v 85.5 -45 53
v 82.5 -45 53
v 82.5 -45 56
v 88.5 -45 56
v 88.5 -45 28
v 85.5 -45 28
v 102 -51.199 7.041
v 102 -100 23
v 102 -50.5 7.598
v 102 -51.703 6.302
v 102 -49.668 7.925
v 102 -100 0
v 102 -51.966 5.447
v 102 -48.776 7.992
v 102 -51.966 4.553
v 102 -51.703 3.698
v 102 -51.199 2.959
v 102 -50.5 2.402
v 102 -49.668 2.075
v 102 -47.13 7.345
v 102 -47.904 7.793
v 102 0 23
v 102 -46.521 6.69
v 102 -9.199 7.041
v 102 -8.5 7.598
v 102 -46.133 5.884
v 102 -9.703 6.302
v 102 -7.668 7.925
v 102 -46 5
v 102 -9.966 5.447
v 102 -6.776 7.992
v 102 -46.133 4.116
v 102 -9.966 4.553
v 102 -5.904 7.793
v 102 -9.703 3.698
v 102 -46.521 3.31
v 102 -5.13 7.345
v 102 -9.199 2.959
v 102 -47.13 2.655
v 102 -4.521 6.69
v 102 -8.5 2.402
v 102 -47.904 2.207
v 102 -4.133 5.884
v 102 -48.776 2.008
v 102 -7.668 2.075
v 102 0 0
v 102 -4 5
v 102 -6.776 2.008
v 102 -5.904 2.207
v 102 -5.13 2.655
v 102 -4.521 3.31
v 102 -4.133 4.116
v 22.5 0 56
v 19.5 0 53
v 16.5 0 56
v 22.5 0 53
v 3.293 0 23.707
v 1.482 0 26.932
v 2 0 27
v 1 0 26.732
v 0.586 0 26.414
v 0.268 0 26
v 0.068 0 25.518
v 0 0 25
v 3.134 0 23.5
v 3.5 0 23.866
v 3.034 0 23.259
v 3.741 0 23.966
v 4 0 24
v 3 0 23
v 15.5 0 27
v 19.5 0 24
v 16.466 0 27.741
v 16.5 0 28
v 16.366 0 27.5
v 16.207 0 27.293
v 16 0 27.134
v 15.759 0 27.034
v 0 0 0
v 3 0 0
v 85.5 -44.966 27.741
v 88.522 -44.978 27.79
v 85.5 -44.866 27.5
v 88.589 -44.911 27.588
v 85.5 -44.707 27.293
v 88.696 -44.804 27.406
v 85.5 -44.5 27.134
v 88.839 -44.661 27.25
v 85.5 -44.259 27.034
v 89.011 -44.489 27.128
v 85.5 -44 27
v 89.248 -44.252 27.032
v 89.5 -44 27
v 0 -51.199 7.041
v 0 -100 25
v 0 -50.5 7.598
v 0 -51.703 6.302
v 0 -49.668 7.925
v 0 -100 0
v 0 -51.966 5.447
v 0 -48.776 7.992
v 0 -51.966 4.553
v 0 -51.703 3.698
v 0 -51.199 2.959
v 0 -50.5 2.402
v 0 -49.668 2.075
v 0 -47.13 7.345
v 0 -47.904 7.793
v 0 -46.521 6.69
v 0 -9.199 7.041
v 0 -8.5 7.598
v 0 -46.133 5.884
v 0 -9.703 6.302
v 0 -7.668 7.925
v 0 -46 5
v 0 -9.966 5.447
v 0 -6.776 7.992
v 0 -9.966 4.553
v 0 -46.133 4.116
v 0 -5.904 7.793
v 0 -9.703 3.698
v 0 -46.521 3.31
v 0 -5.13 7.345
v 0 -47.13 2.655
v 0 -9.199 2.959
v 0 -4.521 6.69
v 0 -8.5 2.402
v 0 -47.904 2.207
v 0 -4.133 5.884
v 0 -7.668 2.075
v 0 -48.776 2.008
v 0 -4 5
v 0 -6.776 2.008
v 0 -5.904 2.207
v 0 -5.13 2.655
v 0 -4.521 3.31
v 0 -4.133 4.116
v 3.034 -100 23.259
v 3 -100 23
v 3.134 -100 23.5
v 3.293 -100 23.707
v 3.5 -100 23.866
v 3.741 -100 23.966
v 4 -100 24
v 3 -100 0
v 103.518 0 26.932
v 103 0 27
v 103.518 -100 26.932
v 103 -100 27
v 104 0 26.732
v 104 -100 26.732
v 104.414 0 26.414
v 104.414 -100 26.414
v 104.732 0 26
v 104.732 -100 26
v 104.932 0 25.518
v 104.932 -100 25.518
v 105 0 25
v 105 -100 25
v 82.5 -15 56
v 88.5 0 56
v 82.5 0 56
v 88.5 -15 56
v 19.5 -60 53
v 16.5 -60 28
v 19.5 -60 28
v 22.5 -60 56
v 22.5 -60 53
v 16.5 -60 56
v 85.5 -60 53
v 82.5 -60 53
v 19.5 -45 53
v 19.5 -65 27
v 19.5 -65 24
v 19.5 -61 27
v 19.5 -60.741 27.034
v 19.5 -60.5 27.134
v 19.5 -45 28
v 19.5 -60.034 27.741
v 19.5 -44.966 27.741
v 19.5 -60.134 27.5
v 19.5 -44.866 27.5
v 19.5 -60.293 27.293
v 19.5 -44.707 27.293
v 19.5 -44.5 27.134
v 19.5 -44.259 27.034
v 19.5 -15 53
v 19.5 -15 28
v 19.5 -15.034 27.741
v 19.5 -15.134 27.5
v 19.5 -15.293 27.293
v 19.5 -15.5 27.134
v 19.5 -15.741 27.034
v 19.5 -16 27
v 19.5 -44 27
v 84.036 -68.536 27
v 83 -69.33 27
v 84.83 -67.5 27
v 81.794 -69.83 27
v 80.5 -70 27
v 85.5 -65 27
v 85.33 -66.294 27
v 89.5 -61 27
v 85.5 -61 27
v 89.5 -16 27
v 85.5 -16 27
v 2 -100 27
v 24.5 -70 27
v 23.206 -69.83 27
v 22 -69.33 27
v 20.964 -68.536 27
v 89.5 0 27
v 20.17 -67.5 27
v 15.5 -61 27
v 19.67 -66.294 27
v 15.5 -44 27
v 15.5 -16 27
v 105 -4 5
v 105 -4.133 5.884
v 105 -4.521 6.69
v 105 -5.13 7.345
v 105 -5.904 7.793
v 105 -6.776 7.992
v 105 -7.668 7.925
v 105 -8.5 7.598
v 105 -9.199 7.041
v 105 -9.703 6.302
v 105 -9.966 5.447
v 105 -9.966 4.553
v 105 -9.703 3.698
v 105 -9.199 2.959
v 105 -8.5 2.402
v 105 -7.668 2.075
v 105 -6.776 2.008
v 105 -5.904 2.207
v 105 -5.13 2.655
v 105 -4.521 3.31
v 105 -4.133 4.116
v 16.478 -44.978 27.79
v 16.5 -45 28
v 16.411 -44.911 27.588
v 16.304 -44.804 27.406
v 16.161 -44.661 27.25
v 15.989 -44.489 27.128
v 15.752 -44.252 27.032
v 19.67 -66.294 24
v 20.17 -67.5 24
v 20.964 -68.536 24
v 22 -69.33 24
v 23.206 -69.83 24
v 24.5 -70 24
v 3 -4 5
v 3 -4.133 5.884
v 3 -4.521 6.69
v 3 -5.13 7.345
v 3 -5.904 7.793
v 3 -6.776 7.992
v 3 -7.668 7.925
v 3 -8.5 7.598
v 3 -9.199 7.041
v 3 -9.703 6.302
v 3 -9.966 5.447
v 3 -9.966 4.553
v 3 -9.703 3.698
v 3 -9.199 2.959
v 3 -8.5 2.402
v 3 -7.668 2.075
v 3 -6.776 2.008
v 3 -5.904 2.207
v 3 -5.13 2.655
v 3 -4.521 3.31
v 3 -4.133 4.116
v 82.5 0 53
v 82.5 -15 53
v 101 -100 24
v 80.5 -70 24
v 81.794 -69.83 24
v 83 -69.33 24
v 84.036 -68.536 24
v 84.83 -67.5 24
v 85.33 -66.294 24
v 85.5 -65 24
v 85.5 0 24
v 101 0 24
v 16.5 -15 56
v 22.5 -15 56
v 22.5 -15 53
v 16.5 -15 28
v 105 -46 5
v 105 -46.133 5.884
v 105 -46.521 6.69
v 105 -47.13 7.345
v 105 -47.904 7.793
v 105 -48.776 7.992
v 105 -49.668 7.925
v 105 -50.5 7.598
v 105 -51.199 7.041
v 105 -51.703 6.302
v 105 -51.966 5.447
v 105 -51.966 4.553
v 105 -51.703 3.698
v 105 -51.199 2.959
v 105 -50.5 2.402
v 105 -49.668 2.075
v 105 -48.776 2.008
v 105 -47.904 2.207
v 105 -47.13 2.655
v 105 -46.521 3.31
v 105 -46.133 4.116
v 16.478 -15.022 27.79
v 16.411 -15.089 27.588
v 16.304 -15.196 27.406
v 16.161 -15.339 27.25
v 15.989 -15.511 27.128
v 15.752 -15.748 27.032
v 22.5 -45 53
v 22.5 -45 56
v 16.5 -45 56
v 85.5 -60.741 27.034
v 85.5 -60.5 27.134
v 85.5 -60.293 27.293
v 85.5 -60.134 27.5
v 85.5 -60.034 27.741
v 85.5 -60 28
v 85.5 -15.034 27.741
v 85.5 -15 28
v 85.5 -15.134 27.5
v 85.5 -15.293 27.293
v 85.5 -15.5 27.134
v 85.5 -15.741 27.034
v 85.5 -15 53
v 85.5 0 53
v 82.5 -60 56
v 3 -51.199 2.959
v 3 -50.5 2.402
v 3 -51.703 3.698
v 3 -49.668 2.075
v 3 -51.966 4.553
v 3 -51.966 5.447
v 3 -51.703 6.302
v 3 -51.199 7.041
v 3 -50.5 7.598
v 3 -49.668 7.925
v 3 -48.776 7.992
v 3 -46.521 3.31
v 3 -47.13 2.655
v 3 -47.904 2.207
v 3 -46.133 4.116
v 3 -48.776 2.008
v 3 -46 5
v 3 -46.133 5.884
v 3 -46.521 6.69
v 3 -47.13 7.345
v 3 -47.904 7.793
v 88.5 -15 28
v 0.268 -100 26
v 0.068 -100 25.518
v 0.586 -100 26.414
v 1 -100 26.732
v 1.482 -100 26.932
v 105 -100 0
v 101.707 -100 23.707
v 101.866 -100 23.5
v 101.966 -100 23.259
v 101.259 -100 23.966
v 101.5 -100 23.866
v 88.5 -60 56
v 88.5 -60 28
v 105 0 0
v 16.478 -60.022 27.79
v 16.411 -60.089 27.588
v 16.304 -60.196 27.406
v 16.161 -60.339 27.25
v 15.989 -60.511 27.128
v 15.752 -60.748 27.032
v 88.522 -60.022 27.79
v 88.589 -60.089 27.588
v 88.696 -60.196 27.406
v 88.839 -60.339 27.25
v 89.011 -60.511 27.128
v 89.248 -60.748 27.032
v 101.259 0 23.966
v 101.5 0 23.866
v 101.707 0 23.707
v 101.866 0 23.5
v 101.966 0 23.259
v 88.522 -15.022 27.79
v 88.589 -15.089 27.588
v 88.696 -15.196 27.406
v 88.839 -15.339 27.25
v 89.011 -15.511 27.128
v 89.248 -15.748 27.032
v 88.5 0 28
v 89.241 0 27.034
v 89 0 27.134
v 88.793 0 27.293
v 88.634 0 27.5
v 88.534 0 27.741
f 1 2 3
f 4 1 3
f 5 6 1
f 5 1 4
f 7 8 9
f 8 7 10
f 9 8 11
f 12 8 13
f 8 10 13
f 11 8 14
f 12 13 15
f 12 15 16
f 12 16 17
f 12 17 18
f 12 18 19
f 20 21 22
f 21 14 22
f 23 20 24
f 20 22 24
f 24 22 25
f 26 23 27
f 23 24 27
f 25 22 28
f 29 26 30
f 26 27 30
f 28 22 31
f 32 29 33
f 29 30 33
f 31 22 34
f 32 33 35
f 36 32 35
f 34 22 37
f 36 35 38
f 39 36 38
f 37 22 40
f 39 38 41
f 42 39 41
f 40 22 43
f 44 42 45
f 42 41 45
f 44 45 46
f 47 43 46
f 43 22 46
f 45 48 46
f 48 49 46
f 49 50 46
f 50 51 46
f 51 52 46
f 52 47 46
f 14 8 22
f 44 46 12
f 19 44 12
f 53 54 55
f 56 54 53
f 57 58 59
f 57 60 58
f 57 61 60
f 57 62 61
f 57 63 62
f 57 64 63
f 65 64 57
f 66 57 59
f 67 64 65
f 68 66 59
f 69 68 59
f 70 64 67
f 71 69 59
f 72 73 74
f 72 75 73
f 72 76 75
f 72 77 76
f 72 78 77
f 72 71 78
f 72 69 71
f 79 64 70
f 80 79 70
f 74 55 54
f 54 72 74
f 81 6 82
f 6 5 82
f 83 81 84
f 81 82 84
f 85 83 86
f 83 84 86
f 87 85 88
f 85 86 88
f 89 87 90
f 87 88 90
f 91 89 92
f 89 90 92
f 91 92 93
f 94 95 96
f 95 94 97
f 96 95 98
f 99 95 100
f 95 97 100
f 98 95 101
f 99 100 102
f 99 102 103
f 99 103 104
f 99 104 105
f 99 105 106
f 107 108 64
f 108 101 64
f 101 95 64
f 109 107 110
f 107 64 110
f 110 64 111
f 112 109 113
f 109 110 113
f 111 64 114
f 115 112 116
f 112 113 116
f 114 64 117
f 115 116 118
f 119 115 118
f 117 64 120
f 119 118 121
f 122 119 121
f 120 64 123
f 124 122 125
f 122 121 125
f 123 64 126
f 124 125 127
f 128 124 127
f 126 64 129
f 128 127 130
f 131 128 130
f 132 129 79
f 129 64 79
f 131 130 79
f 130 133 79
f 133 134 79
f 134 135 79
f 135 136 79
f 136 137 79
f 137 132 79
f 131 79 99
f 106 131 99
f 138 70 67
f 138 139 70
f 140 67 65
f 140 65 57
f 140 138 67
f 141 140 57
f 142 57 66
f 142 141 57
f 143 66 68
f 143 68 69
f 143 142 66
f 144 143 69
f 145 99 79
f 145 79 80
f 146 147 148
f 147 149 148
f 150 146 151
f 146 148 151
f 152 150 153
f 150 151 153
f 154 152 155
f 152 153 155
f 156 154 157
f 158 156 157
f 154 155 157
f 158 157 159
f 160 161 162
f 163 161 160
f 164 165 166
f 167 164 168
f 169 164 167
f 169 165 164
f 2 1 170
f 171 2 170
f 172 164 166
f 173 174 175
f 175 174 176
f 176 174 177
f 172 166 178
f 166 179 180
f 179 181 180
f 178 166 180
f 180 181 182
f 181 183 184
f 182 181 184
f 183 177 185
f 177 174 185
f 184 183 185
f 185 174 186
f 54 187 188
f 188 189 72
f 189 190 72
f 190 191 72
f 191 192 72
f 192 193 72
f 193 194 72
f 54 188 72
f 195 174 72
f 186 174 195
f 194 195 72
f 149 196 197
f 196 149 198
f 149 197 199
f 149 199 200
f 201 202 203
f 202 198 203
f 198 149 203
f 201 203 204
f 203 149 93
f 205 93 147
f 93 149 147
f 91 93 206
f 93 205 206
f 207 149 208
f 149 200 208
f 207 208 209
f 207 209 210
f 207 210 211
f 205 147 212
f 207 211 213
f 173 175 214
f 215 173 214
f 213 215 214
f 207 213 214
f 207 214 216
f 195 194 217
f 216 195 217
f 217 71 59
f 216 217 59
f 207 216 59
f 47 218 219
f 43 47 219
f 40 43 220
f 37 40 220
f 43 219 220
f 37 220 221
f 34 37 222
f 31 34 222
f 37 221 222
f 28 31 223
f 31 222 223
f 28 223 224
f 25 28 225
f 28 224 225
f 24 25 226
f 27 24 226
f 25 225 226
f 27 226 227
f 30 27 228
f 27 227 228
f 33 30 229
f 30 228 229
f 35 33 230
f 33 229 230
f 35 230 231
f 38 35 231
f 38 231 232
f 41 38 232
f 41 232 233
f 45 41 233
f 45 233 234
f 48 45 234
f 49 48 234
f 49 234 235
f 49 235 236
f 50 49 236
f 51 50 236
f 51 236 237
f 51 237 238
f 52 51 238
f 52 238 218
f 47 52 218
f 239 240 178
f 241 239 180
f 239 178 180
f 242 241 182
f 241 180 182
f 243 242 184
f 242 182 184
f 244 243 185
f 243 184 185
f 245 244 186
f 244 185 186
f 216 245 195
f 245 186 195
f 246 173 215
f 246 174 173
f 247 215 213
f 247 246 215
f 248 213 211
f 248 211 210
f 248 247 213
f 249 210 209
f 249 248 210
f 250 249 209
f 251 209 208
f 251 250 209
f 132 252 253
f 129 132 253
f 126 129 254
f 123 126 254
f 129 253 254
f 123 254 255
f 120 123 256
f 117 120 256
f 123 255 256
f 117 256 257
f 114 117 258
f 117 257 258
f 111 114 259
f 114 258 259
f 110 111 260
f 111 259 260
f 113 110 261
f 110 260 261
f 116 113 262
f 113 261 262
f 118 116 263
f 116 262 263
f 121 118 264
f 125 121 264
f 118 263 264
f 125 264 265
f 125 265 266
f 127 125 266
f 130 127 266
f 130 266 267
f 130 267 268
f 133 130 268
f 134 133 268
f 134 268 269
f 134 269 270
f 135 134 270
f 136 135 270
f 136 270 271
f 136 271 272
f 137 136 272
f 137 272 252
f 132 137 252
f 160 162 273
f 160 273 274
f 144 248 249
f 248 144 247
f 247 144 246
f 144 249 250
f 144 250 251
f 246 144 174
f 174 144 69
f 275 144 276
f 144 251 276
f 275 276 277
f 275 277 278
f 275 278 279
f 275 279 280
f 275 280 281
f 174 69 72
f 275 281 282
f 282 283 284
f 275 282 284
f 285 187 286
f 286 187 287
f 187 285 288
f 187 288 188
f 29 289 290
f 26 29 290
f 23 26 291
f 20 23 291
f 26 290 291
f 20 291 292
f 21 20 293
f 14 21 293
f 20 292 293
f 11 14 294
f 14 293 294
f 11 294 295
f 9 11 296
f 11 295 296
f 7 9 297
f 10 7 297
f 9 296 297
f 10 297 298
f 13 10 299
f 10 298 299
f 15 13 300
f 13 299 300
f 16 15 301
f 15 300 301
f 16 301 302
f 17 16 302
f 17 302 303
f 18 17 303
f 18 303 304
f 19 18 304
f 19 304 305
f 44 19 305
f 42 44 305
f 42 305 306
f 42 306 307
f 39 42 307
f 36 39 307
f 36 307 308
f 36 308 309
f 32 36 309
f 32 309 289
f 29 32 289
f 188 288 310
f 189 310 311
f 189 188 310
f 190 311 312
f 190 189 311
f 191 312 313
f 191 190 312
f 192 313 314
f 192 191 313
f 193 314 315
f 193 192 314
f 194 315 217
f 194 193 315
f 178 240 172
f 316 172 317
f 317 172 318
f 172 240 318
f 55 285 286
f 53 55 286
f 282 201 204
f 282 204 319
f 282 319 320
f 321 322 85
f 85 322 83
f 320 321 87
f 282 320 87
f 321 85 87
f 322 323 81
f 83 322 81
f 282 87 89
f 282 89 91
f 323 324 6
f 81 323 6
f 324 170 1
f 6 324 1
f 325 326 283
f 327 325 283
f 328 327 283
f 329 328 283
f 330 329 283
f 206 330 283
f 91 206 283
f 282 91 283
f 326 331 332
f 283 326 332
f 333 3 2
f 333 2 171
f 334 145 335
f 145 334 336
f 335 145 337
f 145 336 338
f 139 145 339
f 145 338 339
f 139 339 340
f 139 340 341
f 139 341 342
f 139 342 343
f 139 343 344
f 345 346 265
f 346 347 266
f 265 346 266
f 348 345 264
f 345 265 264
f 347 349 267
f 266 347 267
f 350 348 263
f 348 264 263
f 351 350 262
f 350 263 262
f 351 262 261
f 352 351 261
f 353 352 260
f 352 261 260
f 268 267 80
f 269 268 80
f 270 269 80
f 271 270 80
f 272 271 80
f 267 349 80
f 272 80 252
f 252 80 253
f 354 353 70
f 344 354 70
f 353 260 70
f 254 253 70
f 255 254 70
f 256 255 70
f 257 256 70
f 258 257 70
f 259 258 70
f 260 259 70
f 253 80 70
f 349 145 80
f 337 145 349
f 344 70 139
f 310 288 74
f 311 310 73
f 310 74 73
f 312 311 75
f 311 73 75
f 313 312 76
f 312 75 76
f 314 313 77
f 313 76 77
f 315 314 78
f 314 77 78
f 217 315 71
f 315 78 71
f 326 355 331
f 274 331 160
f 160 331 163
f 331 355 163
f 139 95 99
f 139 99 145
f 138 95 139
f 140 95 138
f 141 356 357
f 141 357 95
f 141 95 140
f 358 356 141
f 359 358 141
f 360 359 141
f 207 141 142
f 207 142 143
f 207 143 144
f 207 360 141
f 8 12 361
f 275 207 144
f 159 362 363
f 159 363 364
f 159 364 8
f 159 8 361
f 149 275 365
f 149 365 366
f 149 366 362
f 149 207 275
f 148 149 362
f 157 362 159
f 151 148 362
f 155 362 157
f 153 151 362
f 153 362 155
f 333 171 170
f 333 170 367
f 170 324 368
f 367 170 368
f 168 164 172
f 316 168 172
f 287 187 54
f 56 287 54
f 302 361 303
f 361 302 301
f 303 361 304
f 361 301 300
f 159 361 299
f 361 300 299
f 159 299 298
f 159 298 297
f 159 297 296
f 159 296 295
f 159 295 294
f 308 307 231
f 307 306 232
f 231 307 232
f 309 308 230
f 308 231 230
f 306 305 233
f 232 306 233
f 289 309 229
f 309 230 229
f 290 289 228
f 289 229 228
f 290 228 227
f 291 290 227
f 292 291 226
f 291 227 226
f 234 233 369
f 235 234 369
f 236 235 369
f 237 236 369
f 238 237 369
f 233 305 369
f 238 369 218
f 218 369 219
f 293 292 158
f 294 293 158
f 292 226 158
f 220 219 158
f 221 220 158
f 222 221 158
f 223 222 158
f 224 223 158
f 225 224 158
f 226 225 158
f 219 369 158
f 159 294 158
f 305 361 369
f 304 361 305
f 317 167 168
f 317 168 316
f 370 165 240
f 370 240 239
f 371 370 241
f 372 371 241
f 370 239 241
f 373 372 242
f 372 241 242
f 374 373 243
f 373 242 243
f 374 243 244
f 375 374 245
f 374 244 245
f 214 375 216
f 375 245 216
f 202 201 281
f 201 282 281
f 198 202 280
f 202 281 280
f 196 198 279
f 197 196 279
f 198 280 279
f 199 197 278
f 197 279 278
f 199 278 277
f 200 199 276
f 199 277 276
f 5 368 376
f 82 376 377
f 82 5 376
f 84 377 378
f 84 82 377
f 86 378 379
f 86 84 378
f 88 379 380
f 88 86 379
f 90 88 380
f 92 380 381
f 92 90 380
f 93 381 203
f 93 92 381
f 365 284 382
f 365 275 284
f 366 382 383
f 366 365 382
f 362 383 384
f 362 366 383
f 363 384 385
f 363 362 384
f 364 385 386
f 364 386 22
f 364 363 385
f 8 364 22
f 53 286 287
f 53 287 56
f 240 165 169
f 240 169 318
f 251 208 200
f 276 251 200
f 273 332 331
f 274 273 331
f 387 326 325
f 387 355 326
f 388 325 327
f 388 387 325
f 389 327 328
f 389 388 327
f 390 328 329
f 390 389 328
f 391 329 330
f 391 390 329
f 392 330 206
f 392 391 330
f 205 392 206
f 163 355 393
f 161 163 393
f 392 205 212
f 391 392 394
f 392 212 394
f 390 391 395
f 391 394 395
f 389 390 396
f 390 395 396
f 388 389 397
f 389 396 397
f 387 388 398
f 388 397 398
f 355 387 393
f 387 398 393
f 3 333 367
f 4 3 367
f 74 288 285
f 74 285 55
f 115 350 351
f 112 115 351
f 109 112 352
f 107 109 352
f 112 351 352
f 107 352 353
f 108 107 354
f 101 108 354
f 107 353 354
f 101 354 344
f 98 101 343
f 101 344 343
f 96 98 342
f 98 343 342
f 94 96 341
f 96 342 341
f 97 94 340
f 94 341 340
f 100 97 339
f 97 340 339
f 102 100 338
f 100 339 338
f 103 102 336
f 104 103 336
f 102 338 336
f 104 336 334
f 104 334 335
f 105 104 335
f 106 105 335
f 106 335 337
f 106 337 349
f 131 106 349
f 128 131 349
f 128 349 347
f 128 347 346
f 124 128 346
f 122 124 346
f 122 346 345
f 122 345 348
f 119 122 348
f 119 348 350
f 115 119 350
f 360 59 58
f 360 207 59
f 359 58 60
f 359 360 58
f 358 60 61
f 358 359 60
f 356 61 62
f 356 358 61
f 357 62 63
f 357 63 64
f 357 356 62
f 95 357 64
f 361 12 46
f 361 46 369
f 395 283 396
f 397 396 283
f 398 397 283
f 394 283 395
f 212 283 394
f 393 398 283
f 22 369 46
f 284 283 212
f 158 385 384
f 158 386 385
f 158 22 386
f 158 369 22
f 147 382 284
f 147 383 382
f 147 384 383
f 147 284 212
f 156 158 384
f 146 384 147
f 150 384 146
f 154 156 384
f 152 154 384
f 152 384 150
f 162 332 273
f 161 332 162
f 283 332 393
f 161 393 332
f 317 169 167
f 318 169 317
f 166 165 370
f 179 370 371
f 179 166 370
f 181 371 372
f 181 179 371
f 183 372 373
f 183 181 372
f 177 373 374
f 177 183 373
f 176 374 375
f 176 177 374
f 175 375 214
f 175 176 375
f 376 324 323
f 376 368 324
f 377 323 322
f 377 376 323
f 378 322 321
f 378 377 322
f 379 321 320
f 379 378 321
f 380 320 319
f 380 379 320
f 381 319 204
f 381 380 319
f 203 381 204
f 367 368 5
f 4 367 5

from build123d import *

# Parameters (mm, degrees)
F1_DEPTH  = 100
F2_R      = 3
F3_DEPTH  = 105.001
F4_W      = 66
F4_H      = 70
F5_DEPTH  = 25
F6_W      = 3
F6_H      = 15
F7_DEPTH  = 29
F8_W      = 15
F8_H      = 3
F9_DEPTH  = 3
F10_W     = 15
F10_H     = 3
F11_DEPTH = 3
F12_R     = 1
F13_R     = 2
F14_R     = 5


with BuildPart() as f1:
    # F0 (on Front) → F1 (new body)
    with BuildSketch(Plane.XZ):
        Polygon((105, 27), (0, 27), (0, 0), (3, 0), (3, 24), (102, 24), (102, 0), (105, 0), align=None)
    extrude(amount=F1_DEPTH)

    # F2 (on face) → F3 (cut, through all)
    with BuildSketch(Plane.YZ.offset(105)):
        with Locations((-7, 5)):
            Circle(F2_R)
        with Locations((-49, 5)):
            Circle(F2_R)
    extrude(amount=-F3_DEPTH, mode=Mode.SUBTRACT)

    # F4 (on face) → F5 (cut)
    with BuildSketch(Plane.XY.offset(27)):
        with Locations((52.5, -35)):
            Rectangle(F4_W, F4_H)
    extrude(amount=-F5_DEPTH, mode=Mode.SUBTRACT)

    # F6 (on face) → F7 (join)
    with BuildSketch(Plane.XY.offset(27)):
        with Locations((18, -7.5)):
            Rectangle(F6_W, F6_H)
        with Locations((18, -52.5)):
            Rectangle(F6_W, F6_H)
        with Locations((87, -7.5)):
            Rectangle(F6_W, F6_H)
        with Locations((87, -52.5)):
            Rectangle(F6_W, F6_H)
    extrude(amount=F7_DEPTH)

    # F8 (on face) → F9 (join)
    with BuildSketch(Plane.YZ.offset(19.5)):
        with Locations((-52.5, 54.5)):
            Rectangle(F8_W, F8_H)
        with Locations((-7.5, 54.5)):
            Rectangle(F8_W, F8_H)
    extrude(amount=F9_DEPTH)

    # F10 (on face) → F11 (join)
    with BuildSketch(Plane(origin=(85.5, 0, 0), x_dir=(0, -1, 0), z_dir=(-1, 0, 0))):
        with Locations((7.5, 54.5)):
            Rectangle(F10_W, F10_H)
        with Locations((52.5, 54.5)):
            Rectangle(F10_W, F10_H)
    extrude(amount=F11_DEPTH)

    # F12
    f12_edges = [f1.edges().sort_by_distance(p)[0] for p in [
        (3, -50, 24),
        (102, -50, 24),
        (16.5, -7.5, 27),
        (18, -15, 27),
        (16.5, -52.5, 27),
        (18, -60, 27),
        (18, -45, 27),
        (87, -60, 27),
        (88.5, -52.5, 27),
        (87, -15, 27),
        (88.5, -7.5, 27),
        (87, -45, 27),
    ]]
    fillet(f12_edges, radius=F12_R)

    # F13
    f13_edges = [f1.edges().sort_by_distance(p)[0] for p in [
        (0, -50, 27),
        (105, -50, 27),
    ]]
    fillet(f13_edges, radius=F13_R)

    # F14
    f14_edges = [f1.edges().sort_by_distance(p)[0] for p in [
        (85.5, -70, 25.5),
        (19.5, -70, 25.5),
    ]]
    fillet(f14_edges, radius=F14_R)


solid = f1.part
